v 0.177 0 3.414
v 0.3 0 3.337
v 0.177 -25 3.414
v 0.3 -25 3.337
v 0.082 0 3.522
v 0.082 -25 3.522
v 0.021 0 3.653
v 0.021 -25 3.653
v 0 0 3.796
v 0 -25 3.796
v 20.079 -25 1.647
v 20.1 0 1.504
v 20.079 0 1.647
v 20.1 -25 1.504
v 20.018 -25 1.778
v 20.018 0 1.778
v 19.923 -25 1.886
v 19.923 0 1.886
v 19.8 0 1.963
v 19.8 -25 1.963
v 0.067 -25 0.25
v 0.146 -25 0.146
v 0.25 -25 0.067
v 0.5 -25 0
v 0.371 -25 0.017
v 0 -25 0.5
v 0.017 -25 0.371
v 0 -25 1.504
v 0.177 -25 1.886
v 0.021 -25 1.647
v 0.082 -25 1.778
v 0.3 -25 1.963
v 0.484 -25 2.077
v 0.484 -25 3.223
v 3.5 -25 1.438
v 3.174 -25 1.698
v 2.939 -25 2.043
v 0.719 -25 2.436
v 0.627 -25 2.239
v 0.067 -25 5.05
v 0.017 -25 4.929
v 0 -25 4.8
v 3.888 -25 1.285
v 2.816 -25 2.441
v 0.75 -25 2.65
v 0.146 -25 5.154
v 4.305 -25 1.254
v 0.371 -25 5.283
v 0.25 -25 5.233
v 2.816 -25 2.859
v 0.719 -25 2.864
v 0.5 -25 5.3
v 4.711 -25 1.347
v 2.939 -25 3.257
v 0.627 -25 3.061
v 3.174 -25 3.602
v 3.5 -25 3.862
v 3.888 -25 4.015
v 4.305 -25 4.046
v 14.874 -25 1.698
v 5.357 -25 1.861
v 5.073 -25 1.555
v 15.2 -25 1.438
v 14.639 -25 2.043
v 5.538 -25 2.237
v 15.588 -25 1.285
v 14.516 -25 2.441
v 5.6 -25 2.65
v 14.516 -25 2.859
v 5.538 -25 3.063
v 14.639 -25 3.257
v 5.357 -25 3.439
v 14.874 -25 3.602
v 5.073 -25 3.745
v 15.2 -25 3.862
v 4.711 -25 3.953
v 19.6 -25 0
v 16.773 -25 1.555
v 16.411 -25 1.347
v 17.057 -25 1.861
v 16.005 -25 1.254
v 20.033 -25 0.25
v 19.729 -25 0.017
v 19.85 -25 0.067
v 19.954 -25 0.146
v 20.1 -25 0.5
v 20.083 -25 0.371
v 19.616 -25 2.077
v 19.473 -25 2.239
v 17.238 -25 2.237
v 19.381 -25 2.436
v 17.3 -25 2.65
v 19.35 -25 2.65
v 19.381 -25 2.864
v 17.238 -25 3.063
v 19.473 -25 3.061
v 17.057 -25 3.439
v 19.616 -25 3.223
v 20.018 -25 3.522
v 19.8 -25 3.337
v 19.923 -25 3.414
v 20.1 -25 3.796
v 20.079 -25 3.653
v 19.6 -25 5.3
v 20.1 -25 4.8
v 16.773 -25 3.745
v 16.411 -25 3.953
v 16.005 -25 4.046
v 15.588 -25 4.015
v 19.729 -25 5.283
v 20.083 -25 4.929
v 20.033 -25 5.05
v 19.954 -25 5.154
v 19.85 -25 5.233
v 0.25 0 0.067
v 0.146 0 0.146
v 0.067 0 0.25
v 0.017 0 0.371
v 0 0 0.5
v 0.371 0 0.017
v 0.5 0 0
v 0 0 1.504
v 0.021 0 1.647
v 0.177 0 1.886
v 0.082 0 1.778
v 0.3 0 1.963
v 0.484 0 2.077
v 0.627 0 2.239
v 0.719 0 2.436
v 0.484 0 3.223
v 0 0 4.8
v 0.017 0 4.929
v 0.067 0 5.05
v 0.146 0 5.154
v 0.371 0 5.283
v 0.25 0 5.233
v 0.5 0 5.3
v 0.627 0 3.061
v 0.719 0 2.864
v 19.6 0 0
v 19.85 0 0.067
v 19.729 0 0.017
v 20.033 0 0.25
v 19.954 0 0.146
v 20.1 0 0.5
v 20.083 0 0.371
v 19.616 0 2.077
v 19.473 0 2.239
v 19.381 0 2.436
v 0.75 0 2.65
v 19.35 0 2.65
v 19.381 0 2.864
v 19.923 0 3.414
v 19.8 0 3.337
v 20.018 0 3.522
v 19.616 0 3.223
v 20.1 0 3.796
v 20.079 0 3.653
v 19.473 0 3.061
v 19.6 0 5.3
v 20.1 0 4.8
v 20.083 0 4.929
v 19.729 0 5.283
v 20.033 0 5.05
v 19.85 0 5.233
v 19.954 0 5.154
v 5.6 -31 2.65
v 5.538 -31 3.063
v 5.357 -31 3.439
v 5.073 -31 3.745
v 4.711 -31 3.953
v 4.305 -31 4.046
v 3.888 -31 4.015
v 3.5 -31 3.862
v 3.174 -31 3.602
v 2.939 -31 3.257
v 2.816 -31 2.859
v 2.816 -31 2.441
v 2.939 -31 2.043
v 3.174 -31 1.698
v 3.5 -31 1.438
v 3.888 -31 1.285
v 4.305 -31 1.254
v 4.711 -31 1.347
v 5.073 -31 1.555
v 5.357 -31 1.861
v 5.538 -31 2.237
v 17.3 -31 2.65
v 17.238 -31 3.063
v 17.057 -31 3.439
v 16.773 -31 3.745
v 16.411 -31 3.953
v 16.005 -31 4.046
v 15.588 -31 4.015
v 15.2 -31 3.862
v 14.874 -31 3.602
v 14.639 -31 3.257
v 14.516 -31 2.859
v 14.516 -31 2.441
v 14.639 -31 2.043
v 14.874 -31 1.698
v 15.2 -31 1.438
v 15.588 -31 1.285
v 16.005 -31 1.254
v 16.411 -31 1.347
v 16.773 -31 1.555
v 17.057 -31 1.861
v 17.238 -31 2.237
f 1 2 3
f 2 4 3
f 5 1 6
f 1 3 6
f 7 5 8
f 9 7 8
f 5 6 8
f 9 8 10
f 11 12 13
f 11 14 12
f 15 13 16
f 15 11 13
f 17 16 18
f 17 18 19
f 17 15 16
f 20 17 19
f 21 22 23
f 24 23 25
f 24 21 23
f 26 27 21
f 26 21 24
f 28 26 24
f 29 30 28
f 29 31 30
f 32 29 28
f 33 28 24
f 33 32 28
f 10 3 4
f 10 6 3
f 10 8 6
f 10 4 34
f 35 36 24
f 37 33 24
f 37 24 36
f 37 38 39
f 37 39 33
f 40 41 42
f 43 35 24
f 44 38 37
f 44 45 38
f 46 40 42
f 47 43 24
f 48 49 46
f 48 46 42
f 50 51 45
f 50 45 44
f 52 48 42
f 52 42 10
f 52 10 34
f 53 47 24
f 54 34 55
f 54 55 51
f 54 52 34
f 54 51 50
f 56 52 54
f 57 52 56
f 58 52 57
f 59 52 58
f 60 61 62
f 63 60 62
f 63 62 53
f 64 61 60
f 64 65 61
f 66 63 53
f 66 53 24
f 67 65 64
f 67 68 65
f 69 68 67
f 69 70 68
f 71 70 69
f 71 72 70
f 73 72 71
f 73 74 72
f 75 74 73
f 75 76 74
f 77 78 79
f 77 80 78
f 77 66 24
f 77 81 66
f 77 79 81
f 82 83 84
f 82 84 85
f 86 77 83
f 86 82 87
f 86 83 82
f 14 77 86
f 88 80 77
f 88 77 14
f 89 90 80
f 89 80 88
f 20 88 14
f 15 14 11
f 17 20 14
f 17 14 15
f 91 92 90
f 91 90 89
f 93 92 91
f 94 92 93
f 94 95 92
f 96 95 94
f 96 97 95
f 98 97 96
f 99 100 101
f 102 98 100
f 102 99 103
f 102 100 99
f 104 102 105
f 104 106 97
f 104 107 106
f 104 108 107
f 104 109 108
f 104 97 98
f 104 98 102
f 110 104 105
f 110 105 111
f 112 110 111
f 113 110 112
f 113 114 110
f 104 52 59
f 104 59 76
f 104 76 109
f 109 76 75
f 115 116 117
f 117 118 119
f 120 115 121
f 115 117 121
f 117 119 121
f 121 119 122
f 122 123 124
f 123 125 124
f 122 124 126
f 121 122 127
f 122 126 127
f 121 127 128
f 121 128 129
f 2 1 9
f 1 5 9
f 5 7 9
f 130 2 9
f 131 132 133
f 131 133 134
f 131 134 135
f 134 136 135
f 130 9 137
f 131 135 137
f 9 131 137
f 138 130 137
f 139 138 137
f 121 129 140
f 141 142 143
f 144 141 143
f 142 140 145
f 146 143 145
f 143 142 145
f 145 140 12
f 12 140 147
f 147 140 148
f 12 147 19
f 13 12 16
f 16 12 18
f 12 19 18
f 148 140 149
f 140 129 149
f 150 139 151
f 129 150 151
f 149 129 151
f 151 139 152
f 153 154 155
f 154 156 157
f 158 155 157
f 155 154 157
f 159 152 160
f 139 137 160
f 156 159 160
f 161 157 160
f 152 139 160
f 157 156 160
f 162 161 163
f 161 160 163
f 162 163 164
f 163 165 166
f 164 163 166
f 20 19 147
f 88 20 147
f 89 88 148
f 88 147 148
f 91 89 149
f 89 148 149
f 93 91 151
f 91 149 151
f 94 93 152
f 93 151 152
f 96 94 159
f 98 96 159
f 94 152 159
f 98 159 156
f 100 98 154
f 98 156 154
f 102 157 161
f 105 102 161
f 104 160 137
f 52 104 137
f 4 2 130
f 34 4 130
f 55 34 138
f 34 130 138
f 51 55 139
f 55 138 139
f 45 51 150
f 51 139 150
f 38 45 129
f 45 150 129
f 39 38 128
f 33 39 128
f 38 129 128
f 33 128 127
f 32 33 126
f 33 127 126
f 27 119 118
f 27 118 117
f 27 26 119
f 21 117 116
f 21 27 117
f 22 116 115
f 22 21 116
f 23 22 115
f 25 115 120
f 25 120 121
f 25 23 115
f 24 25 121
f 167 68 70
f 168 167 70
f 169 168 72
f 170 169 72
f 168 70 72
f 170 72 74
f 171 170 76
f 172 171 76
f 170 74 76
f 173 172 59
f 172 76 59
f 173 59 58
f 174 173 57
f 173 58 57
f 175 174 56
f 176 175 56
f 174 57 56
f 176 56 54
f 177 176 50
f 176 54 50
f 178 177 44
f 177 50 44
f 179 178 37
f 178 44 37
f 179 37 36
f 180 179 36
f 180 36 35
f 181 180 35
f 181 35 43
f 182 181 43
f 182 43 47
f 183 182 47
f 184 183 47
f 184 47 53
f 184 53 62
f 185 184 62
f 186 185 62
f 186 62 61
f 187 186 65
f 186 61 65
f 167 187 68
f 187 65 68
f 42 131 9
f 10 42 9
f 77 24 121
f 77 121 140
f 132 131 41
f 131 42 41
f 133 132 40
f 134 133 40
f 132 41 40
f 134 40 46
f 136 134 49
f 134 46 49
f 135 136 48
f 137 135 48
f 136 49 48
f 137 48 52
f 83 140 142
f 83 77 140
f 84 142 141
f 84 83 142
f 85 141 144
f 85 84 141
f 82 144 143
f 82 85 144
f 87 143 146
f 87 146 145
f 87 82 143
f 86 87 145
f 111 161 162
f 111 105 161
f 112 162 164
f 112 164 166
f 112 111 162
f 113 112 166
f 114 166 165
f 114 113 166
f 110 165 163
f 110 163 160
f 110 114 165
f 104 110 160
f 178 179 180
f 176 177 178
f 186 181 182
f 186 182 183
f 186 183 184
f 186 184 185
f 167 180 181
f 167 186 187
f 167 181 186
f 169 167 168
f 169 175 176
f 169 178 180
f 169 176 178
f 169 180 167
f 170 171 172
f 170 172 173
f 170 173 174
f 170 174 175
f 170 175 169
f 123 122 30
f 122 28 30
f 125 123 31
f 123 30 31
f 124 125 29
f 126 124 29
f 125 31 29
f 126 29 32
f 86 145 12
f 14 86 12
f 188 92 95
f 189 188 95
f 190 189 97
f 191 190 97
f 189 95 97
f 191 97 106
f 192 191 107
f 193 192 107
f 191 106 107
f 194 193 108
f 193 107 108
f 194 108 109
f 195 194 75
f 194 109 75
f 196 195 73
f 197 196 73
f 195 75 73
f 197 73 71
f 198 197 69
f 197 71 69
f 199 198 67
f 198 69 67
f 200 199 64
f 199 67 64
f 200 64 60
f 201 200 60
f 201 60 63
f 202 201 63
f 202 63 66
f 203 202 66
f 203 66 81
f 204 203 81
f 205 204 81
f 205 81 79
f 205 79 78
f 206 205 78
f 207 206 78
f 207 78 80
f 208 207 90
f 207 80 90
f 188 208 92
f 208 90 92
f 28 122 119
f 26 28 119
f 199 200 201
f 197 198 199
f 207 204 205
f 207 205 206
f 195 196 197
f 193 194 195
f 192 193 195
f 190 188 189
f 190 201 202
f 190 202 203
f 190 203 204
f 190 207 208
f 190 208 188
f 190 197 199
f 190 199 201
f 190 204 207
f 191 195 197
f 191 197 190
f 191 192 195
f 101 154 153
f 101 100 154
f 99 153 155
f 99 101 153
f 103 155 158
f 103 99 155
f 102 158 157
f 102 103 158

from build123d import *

# Parameters (mm, degrees)
F1_DEPTH = 25
F2_R     = 1.4
F3_DEPTH = 6
F4_R     = 0.5


with BuildPart() as f1:
    # F0 (on Front) → F1 (new body)
    with BuildSketch(Plane.XZ):
        with BuildLine():
            Line((0, 1.9), (0, 0))
            Line((0, 0), (20.1, 0))
            Line((20.1, 0), (20.1, 1.9))
            ThreePointArc((20.1, 1.9), (19.35, 2.65), (20.1, 3.4))
            Line((20.1, 3.4), (20.1, 5.3))
            Line((20.1, 5.3), (0, 5.3))
            Line((0, 5.3), (0, 3.4))
            ThreePointArc((0, 3.4), (0.75, 2.65), (0, 1.9))
        make_face()
    extrude(amount=F1_DEPTH)

    # F2 (on face) → F3 (join)
    with BuildSketch(Plane.XZ.offset(25)):
        with Locations((4.2, 2.65)):
            Circle(F2_R)
        with Locations((15.9, 2.65)):
            Circle(F2_R)
    extrude(amount=F3_DEPTH)

    # F4
    f4_edges = [f1.edges().sort_by_distance(p)[0] for p in [
        (20.1, -12.5, 5.3),
        (20.1, -12.5, 3.4),
        (20.1, -12.5, 1.9),
        (20.1, -12.5, 0),
        (0, -12.5, 5.3),
        (0, -12.5, 0),
        (0, -12.5, 1.9),
        (0, -12.5, 3.4),
    ]]
    fillet(f4_edges, radius=F4_R)


solid = f1.part
